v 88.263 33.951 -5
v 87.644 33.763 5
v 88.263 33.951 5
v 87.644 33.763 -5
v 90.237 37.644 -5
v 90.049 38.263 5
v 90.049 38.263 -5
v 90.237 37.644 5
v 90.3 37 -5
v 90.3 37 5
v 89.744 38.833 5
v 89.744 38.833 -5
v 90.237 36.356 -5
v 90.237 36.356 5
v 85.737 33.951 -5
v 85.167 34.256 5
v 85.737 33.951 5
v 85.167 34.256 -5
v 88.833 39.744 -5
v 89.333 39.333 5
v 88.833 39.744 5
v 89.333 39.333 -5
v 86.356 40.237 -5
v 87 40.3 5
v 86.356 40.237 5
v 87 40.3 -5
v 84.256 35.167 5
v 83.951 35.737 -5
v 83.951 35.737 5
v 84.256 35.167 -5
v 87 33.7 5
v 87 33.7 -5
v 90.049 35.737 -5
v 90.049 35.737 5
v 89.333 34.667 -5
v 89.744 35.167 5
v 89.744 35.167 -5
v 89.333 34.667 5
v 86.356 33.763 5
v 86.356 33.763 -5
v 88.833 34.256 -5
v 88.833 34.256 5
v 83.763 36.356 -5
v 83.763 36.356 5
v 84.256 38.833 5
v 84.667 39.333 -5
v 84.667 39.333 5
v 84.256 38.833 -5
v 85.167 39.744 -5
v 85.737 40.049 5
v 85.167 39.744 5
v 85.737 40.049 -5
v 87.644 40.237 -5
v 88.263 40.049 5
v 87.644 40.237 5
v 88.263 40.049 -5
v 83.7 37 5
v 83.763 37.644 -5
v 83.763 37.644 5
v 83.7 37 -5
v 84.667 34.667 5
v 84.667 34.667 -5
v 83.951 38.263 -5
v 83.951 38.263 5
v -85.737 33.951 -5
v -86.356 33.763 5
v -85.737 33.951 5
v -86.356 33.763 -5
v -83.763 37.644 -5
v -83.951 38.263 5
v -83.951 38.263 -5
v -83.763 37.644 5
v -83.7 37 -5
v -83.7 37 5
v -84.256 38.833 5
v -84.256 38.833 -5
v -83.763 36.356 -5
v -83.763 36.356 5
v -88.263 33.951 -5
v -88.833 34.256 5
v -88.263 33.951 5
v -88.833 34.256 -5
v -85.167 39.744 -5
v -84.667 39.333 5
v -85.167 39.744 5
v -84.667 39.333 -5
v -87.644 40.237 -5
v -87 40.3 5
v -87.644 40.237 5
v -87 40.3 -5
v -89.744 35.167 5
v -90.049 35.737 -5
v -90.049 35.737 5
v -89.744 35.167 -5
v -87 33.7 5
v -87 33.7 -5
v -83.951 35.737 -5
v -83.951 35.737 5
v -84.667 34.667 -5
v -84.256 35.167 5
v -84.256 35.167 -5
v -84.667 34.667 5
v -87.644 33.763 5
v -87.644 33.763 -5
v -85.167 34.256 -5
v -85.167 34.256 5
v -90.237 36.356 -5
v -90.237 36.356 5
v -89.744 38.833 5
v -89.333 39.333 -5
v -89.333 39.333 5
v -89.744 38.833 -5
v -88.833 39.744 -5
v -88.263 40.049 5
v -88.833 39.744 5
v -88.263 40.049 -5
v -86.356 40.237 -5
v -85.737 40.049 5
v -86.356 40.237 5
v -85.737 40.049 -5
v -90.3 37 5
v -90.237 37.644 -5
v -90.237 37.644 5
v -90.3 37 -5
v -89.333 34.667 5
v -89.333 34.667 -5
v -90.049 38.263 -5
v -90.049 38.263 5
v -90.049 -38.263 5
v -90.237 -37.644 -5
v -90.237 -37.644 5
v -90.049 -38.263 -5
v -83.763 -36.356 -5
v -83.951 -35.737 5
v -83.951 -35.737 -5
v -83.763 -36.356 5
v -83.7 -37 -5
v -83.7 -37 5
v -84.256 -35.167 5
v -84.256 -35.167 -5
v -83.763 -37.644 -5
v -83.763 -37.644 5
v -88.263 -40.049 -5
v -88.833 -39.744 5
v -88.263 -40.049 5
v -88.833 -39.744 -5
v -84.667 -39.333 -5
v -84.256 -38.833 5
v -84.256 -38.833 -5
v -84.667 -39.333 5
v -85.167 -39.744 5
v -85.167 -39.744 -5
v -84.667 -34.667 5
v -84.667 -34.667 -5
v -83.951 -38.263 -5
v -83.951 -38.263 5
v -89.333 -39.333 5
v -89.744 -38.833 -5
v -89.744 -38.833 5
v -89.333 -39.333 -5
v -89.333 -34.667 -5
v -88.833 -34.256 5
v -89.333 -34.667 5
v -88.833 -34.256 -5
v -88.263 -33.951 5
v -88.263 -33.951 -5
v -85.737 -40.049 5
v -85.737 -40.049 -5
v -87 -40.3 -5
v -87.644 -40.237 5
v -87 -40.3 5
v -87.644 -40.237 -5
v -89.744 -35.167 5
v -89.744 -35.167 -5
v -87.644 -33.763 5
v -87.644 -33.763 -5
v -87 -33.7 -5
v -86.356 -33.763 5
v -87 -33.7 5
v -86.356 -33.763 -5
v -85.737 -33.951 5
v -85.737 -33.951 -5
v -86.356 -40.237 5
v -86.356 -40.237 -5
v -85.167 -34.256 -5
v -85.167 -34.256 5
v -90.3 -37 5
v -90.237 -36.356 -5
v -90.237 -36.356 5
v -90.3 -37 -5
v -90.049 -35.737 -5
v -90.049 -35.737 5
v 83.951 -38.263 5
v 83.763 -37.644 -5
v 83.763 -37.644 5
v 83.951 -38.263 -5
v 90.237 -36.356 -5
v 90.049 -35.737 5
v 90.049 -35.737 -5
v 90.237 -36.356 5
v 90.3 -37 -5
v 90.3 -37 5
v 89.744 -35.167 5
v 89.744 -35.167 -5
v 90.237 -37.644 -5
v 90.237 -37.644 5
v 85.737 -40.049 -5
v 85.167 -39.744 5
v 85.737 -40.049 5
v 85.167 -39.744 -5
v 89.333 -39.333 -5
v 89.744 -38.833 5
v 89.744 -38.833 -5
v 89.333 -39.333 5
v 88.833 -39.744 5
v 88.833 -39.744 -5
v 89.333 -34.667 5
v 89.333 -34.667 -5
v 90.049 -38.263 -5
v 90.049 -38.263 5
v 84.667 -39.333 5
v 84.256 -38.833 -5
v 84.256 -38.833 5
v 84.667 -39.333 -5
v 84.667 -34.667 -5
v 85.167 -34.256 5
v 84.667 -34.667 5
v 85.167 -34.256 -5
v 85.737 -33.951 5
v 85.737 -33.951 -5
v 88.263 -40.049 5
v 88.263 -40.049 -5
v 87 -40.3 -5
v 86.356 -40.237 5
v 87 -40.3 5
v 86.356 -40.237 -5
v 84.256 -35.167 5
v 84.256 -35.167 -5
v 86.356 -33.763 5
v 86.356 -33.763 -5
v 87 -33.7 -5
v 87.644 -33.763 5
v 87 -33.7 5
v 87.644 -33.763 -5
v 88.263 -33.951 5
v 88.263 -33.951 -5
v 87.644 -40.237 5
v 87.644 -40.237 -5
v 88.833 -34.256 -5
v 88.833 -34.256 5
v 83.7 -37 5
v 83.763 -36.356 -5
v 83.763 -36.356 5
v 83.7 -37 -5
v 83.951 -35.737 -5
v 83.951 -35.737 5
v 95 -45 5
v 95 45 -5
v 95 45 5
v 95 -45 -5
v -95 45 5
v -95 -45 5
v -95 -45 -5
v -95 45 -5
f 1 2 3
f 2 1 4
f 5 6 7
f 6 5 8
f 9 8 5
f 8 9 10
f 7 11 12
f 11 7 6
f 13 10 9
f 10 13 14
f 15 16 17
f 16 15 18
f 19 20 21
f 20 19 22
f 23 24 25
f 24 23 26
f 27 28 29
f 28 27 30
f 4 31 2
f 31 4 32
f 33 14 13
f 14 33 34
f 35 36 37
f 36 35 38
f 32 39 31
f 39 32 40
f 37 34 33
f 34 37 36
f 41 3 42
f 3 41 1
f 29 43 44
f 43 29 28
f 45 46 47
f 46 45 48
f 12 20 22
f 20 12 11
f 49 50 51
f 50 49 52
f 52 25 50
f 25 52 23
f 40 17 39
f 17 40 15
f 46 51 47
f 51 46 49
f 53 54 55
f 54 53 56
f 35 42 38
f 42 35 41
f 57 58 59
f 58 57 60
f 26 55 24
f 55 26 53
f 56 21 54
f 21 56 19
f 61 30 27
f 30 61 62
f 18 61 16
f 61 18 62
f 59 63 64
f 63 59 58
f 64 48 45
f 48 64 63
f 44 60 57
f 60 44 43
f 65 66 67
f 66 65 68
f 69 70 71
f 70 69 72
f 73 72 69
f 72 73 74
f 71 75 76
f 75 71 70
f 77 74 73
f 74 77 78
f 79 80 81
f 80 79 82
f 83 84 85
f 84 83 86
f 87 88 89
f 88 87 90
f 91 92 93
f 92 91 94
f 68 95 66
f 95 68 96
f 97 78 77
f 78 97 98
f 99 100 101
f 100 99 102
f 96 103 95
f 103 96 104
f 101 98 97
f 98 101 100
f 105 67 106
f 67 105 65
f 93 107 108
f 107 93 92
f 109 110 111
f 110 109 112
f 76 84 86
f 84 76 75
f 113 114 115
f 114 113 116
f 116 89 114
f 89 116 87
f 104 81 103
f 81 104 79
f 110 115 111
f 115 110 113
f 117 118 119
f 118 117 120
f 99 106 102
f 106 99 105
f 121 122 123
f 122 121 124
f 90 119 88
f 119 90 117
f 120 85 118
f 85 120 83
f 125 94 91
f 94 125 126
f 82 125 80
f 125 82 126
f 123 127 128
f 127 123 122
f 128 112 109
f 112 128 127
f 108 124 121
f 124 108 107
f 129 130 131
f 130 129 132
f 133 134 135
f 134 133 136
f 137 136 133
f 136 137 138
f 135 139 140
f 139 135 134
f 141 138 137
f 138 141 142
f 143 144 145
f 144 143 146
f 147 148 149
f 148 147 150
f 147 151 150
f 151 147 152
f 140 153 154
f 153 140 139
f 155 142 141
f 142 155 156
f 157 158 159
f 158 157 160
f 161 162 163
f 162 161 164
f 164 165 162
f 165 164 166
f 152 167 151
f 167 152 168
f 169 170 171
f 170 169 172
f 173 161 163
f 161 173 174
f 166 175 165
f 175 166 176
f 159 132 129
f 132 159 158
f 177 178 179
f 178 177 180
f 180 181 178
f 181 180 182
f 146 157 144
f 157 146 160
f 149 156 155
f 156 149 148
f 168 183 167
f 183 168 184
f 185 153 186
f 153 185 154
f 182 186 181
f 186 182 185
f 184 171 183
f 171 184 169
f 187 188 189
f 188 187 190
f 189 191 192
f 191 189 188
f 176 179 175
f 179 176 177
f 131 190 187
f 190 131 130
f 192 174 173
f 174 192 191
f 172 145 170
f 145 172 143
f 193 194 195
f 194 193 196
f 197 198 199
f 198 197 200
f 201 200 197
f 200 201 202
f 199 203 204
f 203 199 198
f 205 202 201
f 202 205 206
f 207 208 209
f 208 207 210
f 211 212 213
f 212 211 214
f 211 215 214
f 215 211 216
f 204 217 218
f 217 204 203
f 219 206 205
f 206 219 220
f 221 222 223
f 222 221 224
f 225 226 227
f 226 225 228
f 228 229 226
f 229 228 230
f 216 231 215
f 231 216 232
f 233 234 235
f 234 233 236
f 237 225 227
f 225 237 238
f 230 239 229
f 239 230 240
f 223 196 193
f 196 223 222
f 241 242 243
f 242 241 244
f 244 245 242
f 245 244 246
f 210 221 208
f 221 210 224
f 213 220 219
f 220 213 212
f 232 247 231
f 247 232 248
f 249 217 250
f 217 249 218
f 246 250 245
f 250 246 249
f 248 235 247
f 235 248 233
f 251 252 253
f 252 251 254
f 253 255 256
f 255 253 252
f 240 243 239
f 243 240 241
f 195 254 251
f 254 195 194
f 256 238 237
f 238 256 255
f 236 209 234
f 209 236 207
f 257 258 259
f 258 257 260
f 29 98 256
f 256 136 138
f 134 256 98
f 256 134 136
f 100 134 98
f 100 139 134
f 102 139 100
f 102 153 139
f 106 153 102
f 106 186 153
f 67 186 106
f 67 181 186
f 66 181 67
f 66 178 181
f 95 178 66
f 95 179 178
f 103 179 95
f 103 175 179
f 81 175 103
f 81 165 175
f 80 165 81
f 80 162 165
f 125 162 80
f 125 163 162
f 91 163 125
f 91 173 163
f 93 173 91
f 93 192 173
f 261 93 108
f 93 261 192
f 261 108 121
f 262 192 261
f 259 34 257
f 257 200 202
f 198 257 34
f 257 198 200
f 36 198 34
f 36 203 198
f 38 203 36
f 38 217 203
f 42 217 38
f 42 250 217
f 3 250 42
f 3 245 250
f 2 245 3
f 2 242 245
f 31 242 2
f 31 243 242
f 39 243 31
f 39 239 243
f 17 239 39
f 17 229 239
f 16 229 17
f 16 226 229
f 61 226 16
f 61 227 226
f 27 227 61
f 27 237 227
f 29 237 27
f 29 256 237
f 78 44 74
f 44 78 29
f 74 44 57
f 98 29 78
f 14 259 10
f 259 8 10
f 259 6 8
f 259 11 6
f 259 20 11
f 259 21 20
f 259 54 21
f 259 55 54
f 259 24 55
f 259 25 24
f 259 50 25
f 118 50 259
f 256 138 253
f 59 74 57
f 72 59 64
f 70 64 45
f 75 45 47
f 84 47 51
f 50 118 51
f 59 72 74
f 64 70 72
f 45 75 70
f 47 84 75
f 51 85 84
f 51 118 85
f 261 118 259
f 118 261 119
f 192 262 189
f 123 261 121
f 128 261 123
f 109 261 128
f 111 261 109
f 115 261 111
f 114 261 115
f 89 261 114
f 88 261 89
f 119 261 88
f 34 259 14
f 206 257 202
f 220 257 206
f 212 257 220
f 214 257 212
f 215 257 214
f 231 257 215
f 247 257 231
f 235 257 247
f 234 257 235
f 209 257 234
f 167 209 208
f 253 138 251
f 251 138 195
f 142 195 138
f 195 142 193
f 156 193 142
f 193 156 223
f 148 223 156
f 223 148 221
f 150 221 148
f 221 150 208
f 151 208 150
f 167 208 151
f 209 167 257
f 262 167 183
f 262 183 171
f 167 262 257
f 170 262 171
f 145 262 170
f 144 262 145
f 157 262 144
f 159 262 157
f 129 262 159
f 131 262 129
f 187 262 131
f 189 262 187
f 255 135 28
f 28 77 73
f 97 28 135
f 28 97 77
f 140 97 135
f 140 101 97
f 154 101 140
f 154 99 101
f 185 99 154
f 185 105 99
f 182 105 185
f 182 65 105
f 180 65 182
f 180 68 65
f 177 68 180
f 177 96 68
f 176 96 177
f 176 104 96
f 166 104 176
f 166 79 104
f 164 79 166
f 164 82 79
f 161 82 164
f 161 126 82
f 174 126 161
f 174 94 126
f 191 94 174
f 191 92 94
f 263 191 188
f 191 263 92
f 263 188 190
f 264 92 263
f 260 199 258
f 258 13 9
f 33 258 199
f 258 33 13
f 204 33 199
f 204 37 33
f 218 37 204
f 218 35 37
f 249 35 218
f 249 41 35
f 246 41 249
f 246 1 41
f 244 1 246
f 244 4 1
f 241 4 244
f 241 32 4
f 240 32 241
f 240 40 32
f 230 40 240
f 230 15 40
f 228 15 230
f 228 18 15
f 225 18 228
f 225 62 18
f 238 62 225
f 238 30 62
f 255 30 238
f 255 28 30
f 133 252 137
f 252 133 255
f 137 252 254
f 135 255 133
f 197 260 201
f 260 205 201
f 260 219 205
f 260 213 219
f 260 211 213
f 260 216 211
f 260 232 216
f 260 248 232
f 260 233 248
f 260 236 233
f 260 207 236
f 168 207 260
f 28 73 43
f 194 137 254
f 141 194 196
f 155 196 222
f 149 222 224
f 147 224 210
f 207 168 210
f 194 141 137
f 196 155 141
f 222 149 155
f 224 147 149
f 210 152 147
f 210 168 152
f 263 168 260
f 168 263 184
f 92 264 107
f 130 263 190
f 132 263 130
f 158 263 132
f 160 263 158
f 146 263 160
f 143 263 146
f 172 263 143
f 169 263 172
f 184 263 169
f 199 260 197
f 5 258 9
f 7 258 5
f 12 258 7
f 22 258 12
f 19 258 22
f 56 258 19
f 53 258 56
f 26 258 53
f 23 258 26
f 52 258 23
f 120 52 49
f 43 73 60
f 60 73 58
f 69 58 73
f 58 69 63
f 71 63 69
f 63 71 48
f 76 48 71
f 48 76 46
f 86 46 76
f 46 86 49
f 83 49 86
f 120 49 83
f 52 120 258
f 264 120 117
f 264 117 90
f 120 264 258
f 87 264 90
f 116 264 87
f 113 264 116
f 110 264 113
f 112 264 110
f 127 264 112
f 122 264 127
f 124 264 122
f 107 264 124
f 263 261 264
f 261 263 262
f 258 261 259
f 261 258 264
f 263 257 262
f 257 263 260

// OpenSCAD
$fn = 32;

// ----------------------------------------------------------------------
// Corner plate 190 x 90 x 10
// 4 holes, centres taken from the edge offset
// ----------------------------------------------------------------------

// --- parameters (mm) ---
plate = [190, 90, 10];  // overall size (x, y, z)
seat_tol = 0.1;         // tolerance at the seating features
free_tol = 0.5;         // general tolerance on the free sizes
holes = 4;              // number of holes the drawing asks for
hole_d = 6.6;           // hole diameter
edge = 8;               // hole centre offset from the plate edge

// --- derived feature positions (mm) ---
corner_x = plate[0] / 2 - edge;  // = 87   corner hole X
corner_y = plate[1] / 2 - edge;  // = 37   corner hole Y
feature_centers = [
  [corner_x, corner_y],
  [-corner_x, corner_y],
  [-corner_x, -corner_y],
  [corner_x, -corner_y]
];   // hole centres the loop below drills

// plate outline, every hole drilled through with the same cutters
difference() {
  cube(plate, center = true);
  for (centre = feature_centers)
    translate([centre[0], centre[1], 0])
      cylinder(d = hole_d, h = plate[2] + 2, center = true);
}
